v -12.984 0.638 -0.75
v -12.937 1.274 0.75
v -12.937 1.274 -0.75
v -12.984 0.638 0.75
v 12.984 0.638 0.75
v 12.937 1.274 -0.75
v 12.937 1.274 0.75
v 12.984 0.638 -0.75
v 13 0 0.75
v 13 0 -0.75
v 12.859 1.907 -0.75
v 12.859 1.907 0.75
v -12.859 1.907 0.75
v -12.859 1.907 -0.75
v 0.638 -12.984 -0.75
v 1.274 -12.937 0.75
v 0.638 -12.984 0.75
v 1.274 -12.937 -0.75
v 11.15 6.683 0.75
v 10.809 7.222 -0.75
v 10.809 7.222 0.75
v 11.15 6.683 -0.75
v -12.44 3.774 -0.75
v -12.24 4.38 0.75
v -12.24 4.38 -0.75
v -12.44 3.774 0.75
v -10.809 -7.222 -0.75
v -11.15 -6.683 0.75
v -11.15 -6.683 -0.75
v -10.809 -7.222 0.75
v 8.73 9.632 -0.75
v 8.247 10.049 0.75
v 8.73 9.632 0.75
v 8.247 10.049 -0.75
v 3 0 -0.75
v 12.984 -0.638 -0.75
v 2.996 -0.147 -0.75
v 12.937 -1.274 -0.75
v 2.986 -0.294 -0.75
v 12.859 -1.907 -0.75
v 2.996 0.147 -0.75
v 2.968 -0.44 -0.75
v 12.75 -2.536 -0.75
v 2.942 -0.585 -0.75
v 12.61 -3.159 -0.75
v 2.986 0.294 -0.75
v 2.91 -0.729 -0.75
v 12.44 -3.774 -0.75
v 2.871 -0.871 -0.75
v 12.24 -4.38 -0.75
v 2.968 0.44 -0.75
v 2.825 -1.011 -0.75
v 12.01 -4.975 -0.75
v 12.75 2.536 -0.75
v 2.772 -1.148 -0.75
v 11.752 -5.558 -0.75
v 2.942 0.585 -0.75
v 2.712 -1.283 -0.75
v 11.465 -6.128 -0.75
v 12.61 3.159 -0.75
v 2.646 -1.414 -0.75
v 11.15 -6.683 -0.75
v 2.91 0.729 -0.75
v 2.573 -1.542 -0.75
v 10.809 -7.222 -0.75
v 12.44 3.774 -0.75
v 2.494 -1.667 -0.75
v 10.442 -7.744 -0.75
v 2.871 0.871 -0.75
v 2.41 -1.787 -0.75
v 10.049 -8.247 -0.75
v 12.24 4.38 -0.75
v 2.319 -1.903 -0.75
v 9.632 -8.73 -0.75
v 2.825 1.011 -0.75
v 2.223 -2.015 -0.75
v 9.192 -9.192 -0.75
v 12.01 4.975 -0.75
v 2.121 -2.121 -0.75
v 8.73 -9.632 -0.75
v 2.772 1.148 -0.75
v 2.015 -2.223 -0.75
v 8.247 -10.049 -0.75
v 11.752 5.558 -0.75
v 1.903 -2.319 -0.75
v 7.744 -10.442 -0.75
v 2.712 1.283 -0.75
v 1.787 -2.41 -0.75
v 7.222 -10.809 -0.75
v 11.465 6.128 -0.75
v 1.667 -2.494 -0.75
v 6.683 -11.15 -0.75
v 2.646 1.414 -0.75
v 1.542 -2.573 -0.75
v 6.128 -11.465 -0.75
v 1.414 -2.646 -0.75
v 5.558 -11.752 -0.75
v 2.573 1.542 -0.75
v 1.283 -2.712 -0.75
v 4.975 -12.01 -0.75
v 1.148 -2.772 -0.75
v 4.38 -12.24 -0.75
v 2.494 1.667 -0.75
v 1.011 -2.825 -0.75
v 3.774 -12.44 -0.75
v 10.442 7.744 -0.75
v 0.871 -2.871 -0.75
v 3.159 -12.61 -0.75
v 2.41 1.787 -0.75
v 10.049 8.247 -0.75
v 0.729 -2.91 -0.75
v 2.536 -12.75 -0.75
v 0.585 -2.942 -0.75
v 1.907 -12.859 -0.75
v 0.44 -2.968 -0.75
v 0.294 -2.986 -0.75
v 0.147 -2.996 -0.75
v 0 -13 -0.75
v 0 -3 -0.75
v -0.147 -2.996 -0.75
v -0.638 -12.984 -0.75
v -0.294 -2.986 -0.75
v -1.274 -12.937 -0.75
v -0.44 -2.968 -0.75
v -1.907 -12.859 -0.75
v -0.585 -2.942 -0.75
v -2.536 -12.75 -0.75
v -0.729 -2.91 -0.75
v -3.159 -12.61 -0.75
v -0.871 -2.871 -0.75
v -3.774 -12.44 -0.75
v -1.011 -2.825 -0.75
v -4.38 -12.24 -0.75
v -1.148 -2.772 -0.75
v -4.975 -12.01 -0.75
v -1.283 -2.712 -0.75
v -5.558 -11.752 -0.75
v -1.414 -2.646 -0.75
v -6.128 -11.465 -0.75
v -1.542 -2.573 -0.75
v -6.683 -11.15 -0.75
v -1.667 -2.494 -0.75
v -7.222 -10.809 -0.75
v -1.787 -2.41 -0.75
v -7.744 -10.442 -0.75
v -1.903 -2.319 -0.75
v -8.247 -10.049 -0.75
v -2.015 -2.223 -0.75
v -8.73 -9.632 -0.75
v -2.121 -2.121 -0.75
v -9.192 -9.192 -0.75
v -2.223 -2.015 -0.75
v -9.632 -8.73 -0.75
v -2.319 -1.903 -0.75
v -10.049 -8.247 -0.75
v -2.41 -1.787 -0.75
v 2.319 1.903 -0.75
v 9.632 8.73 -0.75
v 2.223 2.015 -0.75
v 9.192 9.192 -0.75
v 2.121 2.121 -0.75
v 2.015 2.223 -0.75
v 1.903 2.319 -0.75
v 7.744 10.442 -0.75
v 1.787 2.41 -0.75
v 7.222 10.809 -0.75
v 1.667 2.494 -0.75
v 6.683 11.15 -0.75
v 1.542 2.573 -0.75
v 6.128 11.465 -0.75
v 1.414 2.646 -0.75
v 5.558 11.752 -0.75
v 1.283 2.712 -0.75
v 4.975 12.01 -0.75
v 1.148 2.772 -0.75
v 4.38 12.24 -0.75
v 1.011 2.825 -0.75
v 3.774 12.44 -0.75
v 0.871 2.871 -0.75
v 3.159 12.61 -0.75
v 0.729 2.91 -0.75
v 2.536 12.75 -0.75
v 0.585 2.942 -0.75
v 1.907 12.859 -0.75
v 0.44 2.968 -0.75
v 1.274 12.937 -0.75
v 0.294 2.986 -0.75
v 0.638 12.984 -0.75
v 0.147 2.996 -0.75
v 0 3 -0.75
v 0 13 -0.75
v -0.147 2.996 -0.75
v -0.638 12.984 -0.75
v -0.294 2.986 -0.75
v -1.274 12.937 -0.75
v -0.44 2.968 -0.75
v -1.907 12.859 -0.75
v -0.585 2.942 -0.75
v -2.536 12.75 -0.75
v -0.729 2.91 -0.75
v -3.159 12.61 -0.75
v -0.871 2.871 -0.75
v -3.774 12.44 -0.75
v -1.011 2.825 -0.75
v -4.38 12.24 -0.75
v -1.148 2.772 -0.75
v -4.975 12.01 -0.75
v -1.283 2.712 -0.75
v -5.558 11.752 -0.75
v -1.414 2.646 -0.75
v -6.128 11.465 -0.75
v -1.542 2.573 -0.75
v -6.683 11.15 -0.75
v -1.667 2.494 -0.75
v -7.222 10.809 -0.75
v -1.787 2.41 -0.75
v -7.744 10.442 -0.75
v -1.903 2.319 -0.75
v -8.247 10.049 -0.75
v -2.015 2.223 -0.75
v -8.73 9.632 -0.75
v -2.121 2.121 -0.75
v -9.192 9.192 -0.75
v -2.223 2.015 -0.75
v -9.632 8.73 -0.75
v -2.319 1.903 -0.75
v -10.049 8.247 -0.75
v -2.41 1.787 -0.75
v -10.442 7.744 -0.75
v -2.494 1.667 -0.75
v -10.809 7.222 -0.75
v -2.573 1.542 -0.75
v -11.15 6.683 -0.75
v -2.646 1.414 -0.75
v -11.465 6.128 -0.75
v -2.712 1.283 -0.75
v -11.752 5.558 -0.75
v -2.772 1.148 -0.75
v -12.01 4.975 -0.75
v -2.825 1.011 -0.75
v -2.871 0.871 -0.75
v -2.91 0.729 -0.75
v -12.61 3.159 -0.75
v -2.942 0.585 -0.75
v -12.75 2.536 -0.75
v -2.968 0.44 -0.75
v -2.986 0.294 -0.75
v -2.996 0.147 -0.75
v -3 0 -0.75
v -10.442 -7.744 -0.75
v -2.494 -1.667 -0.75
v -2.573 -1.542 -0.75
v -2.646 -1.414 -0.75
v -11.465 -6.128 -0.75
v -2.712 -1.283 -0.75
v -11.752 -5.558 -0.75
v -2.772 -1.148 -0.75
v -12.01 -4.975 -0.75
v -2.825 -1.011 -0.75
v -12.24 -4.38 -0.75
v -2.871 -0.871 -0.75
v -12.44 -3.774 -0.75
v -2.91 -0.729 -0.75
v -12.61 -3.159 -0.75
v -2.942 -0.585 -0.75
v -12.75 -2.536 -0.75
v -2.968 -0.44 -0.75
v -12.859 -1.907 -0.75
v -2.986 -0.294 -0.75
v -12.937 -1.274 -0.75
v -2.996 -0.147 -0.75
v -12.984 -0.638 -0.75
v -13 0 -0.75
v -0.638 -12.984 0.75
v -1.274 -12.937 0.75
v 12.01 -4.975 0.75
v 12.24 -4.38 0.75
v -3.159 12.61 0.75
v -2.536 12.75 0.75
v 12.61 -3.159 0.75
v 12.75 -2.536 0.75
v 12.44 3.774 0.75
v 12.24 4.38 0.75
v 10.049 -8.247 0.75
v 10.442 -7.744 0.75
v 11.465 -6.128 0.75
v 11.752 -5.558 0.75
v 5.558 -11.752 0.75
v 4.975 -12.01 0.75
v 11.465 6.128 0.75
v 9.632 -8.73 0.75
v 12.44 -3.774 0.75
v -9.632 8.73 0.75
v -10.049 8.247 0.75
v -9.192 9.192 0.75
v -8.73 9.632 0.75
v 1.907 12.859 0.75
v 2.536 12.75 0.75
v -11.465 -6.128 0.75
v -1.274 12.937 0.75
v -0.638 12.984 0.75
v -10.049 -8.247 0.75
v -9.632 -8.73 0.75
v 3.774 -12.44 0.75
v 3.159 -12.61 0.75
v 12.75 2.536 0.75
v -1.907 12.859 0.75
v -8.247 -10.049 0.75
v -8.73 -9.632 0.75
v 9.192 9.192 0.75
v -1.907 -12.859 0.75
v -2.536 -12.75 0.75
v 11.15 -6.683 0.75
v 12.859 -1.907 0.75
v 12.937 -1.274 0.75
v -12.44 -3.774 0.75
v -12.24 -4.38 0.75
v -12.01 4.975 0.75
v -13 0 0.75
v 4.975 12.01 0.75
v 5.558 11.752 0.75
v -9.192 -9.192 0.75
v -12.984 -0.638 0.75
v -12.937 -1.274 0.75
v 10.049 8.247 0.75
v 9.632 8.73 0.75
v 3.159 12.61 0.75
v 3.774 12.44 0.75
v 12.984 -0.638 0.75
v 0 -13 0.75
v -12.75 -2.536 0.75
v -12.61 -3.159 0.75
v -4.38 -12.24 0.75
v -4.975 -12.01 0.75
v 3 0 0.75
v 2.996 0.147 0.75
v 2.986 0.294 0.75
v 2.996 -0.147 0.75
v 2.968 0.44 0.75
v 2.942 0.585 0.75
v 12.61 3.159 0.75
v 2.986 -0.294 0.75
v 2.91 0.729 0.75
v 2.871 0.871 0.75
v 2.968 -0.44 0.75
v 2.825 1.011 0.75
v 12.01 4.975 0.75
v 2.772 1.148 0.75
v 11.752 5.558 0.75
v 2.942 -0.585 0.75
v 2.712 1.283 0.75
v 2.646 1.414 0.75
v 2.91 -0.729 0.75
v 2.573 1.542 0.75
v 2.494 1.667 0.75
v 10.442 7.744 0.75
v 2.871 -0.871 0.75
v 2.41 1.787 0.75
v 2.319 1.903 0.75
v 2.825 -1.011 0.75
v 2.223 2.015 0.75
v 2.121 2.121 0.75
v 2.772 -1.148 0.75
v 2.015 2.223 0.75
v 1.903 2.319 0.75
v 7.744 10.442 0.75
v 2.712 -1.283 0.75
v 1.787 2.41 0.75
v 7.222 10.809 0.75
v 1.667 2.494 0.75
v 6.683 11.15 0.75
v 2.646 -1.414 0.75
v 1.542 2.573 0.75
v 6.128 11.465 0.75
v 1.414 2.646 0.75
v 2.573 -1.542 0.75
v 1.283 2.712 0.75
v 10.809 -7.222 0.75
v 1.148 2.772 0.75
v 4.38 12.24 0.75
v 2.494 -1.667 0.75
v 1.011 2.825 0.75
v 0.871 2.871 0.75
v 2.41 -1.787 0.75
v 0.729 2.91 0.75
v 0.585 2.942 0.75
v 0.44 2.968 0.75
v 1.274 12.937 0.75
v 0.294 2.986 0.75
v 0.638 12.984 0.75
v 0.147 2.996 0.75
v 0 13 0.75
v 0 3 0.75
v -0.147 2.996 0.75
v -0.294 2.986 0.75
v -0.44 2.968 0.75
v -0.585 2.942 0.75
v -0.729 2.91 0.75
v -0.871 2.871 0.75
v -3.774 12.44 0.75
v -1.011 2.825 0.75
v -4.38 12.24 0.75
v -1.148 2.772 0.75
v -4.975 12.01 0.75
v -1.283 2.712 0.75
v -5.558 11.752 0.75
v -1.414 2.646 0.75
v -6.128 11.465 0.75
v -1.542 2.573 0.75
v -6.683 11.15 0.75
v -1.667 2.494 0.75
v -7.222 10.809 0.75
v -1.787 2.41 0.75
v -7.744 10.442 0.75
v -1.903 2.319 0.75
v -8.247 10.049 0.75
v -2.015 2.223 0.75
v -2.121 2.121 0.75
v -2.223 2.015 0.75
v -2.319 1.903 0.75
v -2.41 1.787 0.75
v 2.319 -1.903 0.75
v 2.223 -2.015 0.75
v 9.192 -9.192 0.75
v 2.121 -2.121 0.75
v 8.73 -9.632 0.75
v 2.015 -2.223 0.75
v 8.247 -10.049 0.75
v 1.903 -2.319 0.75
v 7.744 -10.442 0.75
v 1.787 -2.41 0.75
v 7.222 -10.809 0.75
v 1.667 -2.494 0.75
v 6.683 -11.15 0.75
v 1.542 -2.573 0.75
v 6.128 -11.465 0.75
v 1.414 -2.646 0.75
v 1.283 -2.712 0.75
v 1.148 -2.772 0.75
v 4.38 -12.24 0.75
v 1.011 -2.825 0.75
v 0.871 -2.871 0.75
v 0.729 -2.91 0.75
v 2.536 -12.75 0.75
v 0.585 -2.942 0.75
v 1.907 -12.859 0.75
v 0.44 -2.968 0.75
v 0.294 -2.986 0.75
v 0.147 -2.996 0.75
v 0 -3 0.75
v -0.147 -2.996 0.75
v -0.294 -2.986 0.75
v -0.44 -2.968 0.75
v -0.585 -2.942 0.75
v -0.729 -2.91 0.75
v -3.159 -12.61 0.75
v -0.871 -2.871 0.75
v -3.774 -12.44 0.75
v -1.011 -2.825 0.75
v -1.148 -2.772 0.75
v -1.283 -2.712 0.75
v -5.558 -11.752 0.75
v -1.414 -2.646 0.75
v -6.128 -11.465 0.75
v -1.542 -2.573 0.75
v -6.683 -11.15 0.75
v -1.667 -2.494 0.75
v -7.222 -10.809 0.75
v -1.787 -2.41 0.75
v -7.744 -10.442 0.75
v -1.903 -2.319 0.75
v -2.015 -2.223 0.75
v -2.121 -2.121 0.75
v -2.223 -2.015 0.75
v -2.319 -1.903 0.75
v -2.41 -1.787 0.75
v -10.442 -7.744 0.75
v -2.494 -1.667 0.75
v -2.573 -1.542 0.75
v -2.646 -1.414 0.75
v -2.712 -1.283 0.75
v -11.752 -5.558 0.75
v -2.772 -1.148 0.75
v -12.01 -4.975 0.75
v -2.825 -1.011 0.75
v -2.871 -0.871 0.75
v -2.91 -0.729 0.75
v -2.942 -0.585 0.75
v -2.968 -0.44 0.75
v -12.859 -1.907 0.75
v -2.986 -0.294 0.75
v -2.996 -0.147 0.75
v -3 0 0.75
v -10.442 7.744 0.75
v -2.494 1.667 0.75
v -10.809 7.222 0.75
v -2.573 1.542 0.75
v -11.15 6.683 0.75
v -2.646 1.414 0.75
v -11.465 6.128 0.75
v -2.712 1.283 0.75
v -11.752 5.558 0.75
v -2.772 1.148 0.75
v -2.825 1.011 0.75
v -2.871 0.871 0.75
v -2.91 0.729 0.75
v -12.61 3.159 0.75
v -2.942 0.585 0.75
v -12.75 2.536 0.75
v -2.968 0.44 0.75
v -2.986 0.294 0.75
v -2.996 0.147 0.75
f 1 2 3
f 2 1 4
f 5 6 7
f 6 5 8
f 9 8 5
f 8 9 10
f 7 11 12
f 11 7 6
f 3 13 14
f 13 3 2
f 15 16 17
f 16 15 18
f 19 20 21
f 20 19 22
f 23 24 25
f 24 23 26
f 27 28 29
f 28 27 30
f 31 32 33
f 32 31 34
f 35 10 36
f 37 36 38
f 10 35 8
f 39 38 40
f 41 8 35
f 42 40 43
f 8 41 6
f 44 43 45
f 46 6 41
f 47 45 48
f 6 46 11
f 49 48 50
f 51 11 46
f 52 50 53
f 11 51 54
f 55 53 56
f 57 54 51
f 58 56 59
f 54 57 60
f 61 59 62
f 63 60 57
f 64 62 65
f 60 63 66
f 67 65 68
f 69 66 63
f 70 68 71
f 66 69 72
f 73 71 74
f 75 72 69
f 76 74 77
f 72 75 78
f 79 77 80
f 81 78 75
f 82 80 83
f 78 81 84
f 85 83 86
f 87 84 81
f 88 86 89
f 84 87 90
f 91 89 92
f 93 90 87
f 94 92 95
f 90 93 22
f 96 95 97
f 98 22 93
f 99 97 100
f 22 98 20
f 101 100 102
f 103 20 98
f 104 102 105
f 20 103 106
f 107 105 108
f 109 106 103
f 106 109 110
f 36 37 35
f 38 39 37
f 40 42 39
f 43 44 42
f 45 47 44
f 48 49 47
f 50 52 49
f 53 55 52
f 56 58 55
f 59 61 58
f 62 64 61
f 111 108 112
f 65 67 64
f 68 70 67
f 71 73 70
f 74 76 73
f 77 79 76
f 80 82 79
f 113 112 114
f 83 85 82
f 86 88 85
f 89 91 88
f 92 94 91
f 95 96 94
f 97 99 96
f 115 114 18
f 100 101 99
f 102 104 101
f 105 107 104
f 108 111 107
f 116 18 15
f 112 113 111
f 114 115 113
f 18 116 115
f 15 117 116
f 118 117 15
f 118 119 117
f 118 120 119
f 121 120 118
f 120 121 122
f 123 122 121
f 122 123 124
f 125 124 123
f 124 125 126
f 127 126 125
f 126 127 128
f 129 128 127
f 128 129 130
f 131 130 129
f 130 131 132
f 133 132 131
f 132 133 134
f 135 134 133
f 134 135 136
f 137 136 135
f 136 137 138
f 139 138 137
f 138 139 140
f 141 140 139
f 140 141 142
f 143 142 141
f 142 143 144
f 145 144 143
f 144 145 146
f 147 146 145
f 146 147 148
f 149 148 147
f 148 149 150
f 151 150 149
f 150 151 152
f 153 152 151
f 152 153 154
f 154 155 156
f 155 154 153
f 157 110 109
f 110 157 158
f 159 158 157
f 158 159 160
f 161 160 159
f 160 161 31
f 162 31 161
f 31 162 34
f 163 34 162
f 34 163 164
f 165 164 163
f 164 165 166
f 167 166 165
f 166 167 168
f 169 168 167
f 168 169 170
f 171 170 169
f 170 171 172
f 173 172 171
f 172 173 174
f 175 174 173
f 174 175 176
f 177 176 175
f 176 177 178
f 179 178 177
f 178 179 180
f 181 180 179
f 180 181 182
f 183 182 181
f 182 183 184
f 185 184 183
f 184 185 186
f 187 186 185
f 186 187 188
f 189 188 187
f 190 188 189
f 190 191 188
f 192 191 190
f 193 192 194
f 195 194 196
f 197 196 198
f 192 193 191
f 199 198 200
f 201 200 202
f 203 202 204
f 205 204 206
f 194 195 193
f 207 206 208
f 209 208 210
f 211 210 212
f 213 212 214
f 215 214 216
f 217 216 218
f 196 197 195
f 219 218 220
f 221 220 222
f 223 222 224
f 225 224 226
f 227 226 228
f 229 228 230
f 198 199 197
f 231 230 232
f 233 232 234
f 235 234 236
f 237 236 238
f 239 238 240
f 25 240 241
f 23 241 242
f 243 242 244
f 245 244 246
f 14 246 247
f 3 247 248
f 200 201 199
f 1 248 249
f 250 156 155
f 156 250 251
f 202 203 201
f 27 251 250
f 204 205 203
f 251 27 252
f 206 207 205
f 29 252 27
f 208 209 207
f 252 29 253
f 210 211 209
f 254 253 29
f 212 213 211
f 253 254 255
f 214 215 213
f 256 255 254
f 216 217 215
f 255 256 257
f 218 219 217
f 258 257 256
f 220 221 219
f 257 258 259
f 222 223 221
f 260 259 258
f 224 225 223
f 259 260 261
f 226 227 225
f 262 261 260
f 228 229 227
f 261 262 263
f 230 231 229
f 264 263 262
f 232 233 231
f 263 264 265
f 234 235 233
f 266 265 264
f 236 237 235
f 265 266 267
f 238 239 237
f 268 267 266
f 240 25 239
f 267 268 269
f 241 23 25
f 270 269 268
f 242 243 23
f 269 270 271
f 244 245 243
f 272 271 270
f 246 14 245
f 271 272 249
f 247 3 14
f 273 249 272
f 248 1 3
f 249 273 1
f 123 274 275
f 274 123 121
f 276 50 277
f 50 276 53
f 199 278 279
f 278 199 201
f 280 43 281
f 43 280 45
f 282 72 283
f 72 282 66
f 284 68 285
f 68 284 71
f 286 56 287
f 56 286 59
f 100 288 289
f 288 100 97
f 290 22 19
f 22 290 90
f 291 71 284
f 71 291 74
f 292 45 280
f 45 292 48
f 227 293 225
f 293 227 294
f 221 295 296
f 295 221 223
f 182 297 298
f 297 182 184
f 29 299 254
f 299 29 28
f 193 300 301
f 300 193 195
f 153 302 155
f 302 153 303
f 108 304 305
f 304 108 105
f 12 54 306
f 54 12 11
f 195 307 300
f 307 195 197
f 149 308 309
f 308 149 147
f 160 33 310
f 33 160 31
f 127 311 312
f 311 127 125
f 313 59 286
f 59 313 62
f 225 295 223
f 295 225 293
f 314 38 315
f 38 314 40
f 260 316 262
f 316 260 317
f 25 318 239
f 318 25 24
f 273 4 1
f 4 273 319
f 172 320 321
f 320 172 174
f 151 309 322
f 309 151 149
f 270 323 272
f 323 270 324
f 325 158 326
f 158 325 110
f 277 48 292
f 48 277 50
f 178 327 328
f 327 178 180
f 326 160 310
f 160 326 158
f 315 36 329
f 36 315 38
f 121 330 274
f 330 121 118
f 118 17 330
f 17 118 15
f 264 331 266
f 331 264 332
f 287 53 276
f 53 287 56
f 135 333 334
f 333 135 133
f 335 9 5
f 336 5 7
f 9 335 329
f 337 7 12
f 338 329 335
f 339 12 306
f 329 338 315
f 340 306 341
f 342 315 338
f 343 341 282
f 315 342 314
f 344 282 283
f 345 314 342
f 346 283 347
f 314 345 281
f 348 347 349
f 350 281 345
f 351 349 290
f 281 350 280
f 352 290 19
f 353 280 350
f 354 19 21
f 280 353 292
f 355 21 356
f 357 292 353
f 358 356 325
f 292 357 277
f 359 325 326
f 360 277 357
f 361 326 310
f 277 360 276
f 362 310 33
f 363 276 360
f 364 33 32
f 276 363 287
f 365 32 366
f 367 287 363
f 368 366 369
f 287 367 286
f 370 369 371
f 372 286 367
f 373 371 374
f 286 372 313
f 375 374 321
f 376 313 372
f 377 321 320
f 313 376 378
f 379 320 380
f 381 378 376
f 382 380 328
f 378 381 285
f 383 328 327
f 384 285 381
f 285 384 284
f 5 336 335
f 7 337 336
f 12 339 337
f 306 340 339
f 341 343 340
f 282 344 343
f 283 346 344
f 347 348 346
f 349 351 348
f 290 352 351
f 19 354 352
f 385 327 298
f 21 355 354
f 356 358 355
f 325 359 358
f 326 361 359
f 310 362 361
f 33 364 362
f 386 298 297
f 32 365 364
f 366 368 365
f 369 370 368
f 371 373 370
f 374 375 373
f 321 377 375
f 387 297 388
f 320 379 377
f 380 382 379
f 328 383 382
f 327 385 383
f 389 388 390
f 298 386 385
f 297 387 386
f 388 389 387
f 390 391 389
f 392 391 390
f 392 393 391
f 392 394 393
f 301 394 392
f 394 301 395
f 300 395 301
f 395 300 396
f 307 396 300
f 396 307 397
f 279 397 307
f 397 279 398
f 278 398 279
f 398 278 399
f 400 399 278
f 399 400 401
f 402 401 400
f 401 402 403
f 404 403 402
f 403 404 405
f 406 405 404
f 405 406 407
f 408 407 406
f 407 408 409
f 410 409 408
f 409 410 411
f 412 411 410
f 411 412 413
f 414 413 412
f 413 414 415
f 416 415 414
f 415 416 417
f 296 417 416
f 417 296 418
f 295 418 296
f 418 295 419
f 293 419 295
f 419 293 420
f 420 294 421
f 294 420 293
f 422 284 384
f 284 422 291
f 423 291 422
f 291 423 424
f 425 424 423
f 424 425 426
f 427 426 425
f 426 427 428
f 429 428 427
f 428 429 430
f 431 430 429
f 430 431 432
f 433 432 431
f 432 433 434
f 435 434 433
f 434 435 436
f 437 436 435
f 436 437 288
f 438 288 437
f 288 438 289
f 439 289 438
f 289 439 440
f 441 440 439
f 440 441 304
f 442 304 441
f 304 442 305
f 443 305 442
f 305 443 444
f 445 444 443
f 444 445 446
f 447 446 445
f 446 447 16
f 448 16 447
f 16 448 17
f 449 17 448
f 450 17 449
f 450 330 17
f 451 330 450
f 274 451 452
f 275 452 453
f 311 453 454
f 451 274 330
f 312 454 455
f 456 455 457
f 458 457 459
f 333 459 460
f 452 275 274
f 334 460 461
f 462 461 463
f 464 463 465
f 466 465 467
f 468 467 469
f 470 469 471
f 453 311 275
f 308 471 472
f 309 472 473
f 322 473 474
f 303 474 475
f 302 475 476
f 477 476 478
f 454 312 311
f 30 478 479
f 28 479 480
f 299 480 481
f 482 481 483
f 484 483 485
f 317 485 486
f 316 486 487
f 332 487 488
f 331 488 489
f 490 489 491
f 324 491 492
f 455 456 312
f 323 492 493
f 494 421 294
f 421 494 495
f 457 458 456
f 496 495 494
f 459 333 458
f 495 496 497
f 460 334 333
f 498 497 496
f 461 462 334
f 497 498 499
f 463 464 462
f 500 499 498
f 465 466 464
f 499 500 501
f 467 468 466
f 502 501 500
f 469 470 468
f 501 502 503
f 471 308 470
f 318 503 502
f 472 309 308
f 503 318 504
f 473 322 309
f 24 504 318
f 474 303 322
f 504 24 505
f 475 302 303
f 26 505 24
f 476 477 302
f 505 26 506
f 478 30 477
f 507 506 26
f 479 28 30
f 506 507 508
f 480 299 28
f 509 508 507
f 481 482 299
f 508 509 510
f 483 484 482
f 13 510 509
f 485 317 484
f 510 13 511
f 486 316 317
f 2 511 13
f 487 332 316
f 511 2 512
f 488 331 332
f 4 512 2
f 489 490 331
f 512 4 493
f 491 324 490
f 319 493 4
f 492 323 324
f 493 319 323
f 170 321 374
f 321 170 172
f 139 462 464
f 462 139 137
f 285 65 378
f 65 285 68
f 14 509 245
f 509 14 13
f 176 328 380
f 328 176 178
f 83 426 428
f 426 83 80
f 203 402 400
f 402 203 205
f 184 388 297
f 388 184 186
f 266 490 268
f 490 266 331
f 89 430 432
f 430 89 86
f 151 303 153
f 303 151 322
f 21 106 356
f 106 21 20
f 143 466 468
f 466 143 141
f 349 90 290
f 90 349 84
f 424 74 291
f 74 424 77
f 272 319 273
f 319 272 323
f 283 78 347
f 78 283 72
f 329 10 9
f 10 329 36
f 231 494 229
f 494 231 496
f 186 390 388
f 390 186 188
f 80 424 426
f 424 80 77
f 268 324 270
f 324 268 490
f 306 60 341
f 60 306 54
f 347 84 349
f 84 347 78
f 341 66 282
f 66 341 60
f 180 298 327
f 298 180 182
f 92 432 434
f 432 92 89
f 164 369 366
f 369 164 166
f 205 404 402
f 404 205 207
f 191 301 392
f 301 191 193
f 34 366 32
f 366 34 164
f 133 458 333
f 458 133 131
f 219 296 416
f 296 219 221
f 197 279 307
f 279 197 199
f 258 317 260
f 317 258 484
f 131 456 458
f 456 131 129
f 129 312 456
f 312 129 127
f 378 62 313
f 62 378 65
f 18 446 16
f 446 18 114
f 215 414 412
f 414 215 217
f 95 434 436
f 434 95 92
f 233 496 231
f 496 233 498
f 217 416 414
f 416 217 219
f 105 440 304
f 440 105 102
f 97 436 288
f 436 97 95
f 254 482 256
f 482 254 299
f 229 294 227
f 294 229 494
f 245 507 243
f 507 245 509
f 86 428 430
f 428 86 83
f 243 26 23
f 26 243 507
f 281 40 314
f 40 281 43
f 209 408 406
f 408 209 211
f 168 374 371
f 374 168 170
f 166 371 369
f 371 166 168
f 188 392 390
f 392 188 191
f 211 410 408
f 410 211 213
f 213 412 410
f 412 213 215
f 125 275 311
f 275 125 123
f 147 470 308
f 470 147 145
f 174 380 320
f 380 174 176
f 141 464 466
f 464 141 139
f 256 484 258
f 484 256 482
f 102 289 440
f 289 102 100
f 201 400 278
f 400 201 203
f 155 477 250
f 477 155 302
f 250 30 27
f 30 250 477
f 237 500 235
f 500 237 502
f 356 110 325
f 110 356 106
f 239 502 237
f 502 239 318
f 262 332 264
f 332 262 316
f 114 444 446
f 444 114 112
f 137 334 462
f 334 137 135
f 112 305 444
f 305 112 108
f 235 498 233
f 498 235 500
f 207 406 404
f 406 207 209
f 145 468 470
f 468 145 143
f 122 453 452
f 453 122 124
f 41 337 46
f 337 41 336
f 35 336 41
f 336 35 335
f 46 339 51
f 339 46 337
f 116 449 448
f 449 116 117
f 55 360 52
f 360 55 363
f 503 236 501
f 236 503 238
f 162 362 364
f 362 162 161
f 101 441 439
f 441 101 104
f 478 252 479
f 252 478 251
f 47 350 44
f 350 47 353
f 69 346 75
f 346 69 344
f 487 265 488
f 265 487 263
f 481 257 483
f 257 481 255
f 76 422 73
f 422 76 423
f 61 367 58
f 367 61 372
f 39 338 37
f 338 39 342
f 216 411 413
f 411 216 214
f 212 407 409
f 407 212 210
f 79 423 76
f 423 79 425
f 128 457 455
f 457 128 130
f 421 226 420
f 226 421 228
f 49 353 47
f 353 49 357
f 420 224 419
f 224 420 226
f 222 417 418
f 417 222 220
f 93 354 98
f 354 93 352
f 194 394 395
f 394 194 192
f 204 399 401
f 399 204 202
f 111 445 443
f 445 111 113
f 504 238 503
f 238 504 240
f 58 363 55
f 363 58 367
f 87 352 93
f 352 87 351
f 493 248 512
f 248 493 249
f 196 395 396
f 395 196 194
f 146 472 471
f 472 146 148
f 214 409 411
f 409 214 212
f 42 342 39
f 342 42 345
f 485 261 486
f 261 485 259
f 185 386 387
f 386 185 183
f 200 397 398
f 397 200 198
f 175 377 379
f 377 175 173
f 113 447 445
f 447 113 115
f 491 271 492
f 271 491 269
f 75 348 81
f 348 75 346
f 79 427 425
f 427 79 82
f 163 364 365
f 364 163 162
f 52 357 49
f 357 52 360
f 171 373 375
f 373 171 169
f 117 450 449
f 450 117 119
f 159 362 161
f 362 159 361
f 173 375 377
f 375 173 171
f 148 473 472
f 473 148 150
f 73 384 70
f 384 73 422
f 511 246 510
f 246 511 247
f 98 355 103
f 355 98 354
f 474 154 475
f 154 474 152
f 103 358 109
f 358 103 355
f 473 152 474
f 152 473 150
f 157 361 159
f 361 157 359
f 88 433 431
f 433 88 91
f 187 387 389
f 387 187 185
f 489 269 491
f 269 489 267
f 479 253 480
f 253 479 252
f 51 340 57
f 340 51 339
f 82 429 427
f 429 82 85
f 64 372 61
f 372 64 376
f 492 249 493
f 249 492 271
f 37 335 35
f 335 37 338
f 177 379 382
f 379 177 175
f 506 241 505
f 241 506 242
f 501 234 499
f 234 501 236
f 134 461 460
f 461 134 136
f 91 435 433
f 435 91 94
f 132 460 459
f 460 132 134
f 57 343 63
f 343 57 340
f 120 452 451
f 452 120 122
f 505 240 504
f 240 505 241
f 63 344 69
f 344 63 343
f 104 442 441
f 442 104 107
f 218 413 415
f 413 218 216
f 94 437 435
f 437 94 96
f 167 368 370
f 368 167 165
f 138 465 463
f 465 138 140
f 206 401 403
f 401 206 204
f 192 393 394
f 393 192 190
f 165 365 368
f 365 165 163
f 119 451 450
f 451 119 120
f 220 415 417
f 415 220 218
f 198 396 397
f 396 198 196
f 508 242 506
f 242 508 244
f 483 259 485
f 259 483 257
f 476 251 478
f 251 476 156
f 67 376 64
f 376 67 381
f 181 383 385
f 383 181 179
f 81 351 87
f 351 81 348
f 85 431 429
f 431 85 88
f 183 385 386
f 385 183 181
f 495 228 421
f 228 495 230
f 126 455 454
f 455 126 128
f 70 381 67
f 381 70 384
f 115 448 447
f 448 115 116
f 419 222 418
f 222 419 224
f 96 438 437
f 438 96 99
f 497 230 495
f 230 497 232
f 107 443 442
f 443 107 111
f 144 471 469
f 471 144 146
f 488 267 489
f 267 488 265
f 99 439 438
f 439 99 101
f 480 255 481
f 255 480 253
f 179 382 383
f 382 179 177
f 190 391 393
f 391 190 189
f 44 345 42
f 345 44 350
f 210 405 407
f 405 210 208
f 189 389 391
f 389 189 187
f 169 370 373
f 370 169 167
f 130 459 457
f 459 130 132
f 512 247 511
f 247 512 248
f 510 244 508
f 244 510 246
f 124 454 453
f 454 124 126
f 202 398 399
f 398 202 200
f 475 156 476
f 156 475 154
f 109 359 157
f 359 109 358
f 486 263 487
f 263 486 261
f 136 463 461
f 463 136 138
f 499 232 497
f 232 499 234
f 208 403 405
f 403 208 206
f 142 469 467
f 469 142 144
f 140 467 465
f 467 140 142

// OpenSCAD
// Penny washer parameters (mm)
inner_diameter = 6.0;   // ID
outer_diameter = 26.0;  // OD
thickness      = 1.5;   // thickness
eps            = 0.2;   // small extra for clean through-cut

$fn = 128;

module penny_washer(id=inner_diameter, od=outer_diameter, t=thickness) {
    difference() {
        cylinder(d=od, h=t, center=true);
        cylinder(d=id, h=t + 2*eps, center=true);
    }
}

penny_washer();
